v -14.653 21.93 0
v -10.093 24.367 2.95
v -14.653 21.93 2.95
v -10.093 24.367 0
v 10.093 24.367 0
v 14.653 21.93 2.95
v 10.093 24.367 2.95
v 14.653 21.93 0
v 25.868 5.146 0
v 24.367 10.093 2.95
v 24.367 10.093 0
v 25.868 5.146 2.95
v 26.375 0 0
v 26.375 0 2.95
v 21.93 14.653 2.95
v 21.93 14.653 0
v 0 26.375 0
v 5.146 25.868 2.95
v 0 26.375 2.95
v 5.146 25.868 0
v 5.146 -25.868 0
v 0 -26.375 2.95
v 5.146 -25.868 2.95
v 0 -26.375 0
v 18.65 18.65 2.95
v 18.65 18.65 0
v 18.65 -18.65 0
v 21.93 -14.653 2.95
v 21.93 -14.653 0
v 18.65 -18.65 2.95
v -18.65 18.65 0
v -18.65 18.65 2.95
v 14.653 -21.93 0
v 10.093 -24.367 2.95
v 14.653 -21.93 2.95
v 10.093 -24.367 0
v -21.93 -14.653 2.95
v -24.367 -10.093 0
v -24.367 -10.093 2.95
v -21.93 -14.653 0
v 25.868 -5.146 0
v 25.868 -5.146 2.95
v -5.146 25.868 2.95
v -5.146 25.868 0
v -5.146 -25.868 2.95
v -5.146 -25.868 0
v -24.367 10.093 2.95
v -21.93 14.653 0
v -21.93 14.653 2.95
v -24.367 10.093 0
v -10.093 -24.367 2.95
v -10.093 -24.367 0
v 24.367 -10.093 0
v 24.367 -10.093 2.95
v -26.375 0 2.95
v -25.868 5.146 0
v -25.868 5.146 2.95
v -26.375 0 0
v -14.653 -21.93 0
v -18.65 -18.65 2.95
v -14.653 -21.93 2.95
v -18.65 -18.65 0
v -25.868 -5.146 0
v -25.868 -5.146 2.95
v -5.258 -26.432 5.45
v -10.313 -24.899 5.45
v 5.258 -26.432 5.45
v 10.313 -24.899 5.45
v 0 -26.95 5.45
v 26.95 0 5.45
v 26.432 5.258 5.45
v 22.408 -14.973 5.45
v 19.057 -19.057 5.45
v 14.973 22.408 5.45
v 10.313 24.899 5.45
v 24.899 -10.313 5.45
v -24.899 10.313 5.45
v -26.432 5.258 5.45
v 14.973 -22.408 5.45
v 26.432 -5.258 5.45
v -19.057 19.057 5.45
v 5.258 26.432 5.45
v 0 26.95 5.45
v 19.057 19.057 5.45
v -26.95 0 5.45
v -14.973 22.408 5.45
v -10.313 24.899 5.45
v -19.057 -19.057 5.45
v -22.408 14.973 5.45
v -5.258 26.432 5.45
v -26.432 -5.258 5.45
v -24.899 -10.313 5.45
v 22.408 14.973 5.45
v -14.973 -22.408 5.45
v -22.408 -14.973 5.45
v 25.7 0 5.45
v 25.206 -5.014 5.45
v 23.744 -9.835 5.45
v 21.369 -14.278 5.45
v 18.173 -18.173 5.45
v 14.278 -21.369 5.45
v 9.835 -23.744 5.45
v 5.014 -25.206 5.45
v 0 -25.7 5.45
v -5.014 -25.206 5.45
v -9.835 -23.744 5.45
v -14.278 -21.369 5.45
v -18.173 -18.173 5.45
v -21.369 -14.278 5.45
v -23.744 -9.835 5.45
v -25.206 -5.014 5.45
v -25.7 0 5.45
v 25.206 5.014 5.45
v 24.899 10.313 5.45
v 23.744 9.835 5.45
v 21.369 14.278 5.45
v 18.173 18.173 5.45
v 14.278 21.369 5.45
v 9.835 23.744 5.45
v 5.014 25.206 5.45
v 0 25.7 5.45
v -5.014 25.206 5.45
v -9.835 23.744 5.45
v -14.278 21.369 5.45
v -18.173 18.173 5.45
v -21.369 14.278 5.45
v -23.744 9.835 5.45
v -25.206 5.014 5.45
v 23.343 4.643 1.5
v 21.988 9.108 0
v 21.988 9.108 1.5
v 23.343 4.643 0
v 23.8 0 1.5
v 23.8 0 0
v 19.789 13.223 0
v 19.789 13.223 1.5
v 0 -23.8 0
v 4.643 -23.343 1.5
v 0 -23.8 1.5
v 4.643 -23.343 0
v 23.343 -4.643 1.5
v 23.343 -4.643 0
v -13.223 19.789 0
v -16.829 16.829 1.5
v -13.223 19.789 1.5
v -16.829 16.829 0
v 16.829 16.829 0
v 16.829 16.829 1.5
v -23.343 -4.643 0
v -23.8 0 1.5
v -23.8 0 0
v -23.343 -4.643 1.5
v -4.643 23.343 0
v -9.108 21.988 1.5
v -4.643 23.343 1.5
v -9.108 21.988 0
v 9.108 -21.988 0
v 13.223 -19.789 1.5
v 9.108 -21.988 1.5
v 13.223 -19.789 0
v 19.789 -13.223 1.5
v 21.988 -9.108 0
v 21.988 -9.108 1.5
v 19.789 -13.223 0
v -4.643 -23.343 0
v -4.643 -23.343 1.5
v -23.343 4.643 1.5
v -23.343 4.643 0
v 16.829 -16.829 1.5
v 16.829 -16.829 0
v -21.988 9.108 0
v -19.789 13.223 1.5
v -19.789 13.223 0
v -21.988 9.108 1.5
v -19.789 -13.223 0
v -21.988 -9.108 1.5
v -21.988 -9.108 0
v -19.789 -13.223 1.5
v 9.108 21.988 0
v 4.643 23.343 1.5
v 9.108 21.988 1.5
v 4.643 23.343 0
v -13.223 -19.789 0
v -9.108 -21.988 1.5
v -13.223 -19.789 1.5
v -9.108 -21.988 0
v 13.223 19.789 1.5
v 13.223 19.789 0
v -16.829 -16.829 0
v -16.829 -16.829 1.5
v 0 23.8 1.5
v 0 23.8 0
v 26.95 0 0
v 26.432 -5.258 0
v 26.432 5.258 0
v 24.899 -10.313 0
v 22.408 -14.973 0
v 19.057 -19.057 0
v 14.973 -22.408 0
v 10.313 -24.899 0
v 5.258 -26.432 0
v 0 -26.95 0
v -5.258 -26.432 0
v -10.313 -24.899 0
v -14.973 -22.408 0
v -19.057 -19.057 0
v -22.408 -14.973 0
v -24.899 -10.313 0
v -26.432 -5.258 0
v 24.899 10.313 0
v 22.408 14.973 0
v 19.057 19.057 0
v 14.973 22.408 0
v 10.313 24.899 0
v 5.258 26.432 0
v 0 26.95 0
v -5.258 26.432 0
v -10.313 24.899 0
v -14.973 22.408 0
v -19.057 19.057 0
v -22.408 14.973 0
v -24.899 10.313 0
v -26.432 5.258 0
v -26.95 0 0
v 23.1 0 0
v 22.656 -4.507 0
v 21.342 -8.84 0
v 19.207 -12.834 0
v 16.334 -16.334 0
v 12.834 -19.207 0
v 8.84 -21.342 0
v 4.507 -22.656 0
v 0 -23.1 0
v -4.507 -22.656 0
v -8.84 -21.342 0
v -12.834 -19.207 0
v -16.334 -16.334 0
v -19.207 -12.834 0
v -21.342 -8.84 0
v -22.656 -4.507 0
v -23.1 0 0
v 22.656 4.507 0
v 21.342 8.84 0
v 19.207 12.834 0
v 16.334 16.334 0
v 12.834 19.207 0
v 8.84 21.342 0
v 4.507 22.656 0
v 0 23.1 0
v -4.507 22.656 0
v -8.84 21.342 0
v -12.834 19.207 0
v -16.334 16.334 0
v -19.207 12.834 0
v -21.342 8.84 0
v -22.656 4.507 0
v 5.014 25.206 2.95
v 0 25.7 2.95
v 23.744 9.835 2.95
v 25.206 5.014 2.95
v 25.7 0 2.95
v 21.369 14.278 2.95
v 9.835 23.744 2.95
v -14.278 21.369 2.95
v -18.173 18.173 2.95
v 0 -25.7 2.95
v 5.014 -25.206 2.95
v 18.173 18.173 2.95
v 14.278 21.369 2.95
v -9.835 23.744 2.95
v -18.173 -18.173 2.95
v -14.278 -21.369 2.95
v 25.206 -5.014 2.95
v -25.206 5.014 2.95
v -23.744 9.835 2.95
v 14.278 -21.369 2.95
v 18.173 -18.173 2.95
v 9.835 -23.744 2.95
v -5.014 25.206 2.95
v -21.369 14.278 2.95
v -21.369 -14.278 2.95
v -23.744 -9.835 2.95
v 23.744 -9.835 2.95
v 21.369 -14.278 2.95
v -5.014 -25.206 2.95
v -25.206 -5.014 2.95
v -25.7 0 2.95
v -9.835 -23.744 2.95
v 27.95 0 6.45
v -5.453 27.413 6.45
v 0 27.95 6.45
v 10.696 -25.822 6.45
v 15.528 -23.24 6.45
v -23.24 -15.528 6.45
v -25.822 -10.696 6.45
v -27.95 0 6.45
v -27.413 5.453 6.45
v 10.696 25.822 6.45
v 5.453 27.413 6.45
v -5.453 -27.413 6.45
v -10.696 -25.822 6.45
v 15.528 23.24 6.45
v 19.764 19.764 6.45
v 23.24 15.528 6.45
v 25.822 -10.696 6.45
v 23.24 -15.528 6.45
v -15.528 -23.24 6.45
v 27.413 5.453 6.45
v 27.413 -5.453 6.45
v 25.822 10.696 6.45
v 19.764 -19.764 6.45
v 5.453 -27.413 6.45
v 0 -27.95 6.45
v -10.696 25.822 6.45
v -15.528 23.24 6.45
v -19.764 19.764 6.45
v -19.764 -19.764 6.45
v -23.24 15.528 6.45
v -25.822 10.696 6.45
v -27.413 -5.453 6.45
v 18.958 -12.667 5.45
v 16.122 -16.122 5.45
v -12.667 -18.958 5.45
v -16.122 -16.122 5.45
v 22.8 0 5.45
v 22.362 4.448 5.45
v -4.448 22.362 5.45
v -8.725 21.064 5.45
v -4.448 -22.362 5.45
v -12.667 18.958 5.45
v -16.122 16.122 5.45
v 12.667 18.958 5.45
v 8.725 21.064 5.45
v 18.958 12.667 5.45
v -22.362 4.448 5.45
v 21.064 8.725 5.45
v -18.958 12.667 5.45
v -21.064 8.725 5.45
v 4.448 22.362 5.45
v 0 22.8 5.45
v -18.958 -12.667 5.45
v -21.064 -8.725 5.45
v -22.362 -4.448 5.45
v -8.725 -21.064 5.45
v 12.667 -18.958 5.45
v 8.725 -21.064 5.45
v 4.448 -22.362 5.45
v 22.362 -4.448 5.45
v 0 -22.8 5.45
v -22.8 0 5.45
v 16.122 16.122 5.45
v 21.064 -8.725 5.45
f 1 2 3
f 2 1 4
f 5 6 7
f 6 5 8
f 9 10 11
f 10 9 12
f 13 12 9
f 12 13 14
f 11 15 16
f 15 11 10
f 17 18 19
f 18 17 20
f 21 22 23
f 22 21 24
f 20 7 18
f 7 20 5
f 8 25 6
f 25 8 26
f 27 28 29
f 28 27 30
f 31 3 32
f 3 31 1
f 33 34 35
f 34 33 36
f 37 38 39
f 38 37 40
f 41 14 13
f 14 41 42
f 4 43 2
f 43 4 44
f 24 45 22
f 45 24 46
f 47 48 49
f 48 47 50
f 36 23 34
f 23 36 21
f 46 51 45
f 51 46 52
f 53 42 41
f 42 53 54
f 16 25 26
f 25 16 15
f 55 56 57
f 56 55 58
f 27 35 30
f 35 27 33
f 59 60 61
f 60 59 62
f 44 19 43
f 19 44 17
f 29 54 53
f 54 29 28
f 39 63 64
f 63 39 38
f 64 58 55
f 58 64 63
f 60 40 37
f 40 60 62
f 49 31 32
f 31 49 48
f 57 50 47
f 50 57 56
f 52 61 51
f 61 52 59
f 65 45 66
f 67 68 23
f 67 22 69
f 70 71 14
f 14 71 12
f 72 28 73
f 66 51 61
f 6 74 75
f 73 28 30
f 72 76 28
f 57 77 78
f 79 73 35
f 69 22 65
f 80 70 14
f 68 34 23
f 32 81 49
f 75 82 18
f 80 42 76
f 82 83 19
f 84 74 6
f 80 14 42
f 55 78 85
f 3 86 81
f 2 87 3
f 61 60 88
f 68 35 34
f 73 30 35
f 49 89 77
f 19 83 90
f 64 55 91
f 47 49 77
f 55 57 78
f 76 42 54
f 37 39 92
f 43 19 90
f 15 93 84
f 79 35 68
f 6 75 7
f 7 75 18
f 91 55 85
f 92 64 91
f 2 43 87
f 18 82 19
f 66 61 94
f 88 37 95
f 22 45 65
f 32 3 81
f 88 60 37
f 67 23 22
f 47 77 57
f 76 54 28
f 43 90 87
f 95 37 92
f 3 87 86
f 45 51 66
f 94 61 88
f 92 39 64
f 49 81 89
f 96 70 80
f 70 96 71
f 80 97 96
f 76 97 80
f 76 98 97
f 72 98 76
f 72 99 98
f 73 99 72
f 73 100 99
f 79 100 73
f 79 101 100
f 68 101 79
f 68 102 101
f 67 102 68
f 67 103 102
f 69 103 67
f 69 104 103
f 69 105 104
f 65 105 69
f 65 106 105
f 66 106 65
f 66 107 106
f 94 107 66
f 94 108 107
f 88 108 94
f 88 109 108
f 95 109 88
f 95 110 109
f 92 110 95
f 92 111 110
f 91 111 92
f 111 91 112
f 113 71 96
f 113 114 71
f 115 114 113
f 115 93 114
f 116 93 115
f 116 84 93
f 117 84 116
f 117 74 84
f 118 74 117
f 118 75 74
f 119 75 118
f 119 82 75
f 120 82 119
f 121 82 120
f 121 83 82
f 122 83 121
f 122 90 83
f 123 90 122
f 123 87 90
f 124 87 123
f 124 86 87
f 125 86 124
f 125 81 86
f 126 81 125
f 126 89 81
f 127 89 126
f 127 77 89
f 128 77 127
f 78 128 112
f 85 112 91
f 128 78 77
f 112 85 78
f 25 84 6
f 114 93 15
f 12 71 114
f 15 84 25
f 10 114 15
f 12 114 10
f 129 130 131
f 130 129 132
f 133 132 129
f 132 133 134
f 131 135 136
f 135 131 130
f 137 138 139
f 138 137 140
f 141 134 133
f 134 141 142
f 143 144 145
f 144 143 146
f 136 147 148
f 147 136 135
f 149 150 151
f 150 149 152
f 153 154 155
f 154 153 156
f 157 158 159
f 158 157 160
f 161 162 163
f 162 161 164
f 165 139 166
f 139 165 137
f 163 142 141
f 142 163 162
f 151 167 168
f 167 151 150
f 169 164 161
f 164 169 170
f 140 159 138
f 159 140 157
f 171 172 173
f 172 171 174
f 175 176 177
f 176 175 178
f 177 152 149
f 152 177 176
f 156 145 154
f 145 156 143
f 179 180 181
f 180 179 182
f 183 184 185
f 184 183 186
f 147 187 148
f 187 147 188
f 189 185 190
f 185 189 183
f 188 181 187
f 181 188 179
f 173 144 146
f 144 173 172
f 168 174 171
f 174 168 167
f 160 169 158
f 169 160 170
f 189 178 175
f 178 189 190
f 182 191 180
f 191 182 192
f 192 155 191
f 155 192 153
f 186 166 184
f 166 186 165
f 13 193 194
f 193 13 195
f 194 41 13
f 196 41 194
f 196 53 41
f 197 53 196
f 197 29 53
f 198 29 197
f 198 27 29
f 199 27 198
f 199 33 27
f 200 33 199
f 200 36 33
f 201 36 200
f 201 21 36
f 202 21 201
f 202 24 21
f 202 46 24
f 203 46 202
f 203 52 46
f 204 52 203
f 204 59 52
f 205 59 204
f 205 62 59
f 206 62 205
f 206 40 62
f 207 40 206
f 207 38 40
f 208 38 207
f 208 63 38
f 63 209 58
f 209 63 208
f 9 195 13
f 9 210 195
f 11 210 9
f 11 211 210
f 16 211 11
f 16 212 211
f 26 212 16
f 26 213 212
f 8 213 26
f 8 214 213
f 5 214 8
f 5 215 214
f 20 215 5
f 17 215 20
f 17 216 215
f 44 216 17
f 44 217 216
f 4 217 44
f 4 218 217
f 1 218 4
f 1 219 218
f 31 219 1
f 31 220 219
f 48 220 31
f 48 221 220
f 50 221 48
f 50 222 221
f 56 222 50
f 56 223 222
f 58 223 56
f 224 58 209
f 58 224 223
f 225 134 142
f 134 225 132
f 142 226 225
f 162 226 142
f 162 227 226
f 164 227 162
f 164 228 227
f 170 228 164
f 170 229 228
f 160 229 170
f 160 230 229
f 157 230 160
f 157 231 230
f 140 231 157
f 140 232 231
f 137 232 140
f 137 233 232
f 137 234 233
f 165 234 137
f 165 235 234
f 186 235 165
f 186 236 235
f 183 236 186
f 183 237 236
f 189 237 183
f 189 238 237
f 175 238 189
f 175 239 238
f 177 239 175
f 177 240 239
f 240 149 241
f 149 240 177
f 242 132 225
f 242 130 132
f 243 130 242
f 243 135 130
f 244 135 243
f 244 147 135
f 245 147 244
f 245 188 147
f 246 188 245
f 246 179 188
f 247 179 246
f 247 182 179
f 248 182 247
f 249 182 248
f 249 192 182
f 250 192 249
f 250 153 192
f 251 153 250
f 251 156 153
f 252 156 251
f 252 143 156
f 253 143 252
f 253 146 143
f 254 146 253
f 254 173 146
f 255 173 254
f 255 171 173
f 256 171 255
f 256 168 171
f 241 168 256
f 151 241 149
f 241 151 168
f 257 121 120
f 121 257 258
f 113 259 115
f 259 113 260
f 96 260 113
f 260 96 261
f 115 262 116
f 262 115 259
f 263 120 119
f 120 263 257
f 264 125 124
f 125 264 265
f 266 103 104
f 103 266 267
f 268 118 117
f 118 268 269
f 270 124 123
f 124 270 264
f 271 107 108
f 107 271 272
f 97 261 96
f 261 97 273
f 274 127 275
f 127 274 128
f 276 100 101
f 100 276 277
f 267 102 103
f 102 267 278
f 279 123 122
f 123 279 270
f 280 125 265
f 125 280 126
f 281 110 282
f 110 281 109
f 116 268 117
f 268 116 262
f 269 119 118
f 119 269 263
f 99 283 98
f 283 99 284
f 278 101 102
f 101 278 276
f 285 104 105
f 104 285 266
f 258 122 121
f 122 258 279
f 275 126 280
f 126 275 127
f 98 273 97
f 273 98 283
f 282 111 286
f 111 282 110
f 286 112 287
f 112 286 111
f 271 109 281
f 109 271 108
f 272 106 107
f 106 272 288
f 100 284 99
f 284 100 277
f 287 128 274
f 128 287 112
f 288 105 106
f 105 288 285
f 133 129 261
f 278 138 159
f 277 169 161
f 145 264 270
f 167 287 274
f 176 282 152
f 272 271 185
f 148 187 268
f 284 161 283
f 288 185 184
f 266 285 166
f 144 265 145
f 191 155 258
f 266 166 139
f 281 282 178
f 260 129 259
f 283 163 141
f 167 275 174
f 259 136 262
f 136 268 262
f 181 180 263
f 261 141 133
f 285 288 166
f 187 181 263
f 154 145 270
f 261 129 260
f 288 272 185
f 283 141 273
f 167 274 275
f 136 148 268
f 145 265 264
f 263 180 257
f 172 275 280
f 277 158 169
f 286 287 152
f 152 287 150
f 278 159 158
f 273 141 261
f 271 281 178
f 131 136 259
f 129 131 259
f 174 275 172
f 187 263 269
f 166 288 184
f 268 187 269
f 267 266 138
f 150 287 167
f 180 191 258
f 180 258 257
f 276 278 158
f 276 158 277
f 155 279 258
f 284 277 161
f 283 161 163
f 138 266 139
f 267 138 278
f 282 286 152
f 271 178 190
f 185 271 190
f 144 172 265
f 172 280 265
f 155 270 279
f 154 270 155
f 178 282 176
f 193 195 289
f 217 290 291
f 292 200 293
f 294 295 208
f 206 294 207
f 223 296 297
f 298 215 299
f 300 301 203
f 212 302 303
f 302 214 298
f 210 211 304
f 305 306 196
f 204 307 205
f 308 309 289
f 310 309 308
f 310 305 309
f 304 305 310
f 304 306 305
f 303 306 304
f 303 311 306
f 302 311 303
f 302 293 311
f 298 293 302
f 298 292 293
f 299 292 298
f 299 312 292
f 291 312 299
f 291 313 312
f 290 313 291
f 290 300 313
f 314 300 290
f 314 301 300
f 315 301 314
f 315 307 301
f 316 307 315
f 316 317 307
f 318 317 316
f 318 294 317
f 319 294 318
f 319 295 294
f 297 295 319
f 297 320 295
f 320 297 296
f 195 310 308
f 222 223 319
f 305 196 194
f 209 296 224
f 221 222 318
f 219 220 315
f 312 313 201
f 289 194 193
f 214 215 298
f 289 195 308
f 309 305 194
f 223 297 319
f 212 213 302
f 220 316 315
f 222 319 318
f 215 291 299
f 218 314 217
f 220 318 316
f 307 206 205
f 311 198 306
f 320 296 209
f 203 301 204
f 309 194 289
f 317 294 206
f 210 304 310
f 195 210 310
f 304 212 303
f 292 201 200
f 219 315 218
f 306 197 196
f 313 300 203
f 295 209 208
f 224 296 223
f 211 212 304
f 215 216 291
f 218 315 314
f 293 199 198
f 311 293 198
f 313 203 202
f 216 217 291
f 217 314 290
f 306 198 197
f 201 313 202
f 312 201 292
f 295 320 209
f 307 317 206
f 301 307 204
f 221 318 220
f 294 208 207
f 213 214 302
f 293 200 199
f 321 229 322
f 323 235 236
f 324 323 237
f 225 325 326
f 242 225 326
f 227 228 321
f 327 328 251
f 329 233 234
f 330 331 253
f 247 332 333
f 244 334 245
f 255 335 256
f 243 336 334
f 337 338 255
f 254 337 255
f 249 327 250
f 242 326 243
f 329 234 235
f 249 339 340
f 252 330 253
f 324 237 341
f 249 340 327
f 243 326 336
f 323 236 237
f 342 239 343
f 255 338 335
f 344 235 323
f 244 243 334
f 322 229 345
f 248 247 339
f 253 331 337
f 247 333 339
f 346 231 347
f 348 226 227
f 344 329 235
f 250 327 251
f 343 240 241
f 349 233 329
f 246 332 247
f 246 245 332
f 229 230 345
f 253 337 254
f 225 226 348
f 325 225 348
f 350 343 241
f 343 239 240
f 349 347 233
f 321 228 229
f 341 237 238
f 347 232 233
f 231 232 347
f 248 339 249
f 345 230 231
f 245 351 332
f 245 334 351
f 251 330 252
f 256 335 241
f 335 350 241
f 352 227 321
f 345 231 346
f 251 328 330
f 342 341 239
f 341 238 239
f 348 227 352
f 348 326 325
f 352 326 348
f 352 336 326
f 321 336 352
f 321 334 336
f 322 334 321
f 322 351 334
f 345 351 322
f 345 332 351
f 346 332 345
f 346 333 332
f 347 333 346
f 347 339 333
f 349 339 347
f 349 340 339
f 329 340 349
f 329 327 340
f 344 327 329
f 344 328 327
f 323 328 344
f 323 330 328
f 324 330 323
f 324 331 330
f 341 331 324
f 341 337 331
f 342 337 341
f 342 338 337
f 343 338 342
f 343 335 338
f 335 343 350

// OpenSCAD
// TPU Can Lid

$fn = 32;

can_lip_outer_dia = 53.9;
can_lip_outer_rad = can_lip_outer_dia/2;
can_under_lip_dia = 52.5+0.25;//+0.75;
can_under_lip_rad = can_under_lip_dia/2;
can_lip_h = 2.5;
can_under_lip_h = 3.0;
can_lip_thick = 1.25;
can_lip_inner_dia = can_lip_outer_dia - 2*can_lip_thick;
can_lip_inner_rad = can_lip_inner_dia/2;
inset_dia = 47.6;
inset_rad = inset_dia/2;
inset_depth = 1.5;
inset_dist = 1.0;
inset_start_depth = 3.95;

seal_h = inset_start_depth + inset_depth;
seal_thick = 1.0;

module canTop3D() {
    difference() {
        union() { // Outline of can
            cylinder(h=inset_start_depth+inset_depth, r=can_under_lip_rad);
            translate([0,0,inset_start_depth+inset_depth])
            cylinder(h=can_lip_h, r1=can_under_lip_rad, r2=can_lip_outer_rad);
        }
        union() { // Inside of can
            translate([0,0,inset_start_depth+inset_depth])
            cylinder(h=can_lip_h, r=can_lip_inner_rad);
            translate([0,0,can_lip_h+inset_depth])
            cylinder(h=inset_start_depth-can_lip_h, r1=inset_rad, r2=can_lip_inner_rad);
            translate([0,0,can_lip_h])
            difference() {
                cylinder(h=inset_depth, r=inset_rad);
                cylinder(h=inset_depth, r=inset_rad-inset_dist);
            }
        }
        
    }
}

module canLipSeal3D() {
    translate([0,0,-can_lip_h])
    difference() {
    translate([0,0,can_lip_h])
    cylinder(h=inset_depth+inset_start_depth+seal_thick, r1=seal_thick+can_lip_outer_rad-1.0, r2=seal_thick+can_lip_outer_rad);
    canTop3D();
    translate([0,0,can_lip_h])
    cylinder(h=inset_start_depth+inset_depth, r1=inset_rad-inset_dist+0.3, r2=inset_rad-inset_dist);
    }
}

//canTop3D();

difference() {
//canTop3D();
canLipSeal3D();
//cube([500,500,500]);
}
